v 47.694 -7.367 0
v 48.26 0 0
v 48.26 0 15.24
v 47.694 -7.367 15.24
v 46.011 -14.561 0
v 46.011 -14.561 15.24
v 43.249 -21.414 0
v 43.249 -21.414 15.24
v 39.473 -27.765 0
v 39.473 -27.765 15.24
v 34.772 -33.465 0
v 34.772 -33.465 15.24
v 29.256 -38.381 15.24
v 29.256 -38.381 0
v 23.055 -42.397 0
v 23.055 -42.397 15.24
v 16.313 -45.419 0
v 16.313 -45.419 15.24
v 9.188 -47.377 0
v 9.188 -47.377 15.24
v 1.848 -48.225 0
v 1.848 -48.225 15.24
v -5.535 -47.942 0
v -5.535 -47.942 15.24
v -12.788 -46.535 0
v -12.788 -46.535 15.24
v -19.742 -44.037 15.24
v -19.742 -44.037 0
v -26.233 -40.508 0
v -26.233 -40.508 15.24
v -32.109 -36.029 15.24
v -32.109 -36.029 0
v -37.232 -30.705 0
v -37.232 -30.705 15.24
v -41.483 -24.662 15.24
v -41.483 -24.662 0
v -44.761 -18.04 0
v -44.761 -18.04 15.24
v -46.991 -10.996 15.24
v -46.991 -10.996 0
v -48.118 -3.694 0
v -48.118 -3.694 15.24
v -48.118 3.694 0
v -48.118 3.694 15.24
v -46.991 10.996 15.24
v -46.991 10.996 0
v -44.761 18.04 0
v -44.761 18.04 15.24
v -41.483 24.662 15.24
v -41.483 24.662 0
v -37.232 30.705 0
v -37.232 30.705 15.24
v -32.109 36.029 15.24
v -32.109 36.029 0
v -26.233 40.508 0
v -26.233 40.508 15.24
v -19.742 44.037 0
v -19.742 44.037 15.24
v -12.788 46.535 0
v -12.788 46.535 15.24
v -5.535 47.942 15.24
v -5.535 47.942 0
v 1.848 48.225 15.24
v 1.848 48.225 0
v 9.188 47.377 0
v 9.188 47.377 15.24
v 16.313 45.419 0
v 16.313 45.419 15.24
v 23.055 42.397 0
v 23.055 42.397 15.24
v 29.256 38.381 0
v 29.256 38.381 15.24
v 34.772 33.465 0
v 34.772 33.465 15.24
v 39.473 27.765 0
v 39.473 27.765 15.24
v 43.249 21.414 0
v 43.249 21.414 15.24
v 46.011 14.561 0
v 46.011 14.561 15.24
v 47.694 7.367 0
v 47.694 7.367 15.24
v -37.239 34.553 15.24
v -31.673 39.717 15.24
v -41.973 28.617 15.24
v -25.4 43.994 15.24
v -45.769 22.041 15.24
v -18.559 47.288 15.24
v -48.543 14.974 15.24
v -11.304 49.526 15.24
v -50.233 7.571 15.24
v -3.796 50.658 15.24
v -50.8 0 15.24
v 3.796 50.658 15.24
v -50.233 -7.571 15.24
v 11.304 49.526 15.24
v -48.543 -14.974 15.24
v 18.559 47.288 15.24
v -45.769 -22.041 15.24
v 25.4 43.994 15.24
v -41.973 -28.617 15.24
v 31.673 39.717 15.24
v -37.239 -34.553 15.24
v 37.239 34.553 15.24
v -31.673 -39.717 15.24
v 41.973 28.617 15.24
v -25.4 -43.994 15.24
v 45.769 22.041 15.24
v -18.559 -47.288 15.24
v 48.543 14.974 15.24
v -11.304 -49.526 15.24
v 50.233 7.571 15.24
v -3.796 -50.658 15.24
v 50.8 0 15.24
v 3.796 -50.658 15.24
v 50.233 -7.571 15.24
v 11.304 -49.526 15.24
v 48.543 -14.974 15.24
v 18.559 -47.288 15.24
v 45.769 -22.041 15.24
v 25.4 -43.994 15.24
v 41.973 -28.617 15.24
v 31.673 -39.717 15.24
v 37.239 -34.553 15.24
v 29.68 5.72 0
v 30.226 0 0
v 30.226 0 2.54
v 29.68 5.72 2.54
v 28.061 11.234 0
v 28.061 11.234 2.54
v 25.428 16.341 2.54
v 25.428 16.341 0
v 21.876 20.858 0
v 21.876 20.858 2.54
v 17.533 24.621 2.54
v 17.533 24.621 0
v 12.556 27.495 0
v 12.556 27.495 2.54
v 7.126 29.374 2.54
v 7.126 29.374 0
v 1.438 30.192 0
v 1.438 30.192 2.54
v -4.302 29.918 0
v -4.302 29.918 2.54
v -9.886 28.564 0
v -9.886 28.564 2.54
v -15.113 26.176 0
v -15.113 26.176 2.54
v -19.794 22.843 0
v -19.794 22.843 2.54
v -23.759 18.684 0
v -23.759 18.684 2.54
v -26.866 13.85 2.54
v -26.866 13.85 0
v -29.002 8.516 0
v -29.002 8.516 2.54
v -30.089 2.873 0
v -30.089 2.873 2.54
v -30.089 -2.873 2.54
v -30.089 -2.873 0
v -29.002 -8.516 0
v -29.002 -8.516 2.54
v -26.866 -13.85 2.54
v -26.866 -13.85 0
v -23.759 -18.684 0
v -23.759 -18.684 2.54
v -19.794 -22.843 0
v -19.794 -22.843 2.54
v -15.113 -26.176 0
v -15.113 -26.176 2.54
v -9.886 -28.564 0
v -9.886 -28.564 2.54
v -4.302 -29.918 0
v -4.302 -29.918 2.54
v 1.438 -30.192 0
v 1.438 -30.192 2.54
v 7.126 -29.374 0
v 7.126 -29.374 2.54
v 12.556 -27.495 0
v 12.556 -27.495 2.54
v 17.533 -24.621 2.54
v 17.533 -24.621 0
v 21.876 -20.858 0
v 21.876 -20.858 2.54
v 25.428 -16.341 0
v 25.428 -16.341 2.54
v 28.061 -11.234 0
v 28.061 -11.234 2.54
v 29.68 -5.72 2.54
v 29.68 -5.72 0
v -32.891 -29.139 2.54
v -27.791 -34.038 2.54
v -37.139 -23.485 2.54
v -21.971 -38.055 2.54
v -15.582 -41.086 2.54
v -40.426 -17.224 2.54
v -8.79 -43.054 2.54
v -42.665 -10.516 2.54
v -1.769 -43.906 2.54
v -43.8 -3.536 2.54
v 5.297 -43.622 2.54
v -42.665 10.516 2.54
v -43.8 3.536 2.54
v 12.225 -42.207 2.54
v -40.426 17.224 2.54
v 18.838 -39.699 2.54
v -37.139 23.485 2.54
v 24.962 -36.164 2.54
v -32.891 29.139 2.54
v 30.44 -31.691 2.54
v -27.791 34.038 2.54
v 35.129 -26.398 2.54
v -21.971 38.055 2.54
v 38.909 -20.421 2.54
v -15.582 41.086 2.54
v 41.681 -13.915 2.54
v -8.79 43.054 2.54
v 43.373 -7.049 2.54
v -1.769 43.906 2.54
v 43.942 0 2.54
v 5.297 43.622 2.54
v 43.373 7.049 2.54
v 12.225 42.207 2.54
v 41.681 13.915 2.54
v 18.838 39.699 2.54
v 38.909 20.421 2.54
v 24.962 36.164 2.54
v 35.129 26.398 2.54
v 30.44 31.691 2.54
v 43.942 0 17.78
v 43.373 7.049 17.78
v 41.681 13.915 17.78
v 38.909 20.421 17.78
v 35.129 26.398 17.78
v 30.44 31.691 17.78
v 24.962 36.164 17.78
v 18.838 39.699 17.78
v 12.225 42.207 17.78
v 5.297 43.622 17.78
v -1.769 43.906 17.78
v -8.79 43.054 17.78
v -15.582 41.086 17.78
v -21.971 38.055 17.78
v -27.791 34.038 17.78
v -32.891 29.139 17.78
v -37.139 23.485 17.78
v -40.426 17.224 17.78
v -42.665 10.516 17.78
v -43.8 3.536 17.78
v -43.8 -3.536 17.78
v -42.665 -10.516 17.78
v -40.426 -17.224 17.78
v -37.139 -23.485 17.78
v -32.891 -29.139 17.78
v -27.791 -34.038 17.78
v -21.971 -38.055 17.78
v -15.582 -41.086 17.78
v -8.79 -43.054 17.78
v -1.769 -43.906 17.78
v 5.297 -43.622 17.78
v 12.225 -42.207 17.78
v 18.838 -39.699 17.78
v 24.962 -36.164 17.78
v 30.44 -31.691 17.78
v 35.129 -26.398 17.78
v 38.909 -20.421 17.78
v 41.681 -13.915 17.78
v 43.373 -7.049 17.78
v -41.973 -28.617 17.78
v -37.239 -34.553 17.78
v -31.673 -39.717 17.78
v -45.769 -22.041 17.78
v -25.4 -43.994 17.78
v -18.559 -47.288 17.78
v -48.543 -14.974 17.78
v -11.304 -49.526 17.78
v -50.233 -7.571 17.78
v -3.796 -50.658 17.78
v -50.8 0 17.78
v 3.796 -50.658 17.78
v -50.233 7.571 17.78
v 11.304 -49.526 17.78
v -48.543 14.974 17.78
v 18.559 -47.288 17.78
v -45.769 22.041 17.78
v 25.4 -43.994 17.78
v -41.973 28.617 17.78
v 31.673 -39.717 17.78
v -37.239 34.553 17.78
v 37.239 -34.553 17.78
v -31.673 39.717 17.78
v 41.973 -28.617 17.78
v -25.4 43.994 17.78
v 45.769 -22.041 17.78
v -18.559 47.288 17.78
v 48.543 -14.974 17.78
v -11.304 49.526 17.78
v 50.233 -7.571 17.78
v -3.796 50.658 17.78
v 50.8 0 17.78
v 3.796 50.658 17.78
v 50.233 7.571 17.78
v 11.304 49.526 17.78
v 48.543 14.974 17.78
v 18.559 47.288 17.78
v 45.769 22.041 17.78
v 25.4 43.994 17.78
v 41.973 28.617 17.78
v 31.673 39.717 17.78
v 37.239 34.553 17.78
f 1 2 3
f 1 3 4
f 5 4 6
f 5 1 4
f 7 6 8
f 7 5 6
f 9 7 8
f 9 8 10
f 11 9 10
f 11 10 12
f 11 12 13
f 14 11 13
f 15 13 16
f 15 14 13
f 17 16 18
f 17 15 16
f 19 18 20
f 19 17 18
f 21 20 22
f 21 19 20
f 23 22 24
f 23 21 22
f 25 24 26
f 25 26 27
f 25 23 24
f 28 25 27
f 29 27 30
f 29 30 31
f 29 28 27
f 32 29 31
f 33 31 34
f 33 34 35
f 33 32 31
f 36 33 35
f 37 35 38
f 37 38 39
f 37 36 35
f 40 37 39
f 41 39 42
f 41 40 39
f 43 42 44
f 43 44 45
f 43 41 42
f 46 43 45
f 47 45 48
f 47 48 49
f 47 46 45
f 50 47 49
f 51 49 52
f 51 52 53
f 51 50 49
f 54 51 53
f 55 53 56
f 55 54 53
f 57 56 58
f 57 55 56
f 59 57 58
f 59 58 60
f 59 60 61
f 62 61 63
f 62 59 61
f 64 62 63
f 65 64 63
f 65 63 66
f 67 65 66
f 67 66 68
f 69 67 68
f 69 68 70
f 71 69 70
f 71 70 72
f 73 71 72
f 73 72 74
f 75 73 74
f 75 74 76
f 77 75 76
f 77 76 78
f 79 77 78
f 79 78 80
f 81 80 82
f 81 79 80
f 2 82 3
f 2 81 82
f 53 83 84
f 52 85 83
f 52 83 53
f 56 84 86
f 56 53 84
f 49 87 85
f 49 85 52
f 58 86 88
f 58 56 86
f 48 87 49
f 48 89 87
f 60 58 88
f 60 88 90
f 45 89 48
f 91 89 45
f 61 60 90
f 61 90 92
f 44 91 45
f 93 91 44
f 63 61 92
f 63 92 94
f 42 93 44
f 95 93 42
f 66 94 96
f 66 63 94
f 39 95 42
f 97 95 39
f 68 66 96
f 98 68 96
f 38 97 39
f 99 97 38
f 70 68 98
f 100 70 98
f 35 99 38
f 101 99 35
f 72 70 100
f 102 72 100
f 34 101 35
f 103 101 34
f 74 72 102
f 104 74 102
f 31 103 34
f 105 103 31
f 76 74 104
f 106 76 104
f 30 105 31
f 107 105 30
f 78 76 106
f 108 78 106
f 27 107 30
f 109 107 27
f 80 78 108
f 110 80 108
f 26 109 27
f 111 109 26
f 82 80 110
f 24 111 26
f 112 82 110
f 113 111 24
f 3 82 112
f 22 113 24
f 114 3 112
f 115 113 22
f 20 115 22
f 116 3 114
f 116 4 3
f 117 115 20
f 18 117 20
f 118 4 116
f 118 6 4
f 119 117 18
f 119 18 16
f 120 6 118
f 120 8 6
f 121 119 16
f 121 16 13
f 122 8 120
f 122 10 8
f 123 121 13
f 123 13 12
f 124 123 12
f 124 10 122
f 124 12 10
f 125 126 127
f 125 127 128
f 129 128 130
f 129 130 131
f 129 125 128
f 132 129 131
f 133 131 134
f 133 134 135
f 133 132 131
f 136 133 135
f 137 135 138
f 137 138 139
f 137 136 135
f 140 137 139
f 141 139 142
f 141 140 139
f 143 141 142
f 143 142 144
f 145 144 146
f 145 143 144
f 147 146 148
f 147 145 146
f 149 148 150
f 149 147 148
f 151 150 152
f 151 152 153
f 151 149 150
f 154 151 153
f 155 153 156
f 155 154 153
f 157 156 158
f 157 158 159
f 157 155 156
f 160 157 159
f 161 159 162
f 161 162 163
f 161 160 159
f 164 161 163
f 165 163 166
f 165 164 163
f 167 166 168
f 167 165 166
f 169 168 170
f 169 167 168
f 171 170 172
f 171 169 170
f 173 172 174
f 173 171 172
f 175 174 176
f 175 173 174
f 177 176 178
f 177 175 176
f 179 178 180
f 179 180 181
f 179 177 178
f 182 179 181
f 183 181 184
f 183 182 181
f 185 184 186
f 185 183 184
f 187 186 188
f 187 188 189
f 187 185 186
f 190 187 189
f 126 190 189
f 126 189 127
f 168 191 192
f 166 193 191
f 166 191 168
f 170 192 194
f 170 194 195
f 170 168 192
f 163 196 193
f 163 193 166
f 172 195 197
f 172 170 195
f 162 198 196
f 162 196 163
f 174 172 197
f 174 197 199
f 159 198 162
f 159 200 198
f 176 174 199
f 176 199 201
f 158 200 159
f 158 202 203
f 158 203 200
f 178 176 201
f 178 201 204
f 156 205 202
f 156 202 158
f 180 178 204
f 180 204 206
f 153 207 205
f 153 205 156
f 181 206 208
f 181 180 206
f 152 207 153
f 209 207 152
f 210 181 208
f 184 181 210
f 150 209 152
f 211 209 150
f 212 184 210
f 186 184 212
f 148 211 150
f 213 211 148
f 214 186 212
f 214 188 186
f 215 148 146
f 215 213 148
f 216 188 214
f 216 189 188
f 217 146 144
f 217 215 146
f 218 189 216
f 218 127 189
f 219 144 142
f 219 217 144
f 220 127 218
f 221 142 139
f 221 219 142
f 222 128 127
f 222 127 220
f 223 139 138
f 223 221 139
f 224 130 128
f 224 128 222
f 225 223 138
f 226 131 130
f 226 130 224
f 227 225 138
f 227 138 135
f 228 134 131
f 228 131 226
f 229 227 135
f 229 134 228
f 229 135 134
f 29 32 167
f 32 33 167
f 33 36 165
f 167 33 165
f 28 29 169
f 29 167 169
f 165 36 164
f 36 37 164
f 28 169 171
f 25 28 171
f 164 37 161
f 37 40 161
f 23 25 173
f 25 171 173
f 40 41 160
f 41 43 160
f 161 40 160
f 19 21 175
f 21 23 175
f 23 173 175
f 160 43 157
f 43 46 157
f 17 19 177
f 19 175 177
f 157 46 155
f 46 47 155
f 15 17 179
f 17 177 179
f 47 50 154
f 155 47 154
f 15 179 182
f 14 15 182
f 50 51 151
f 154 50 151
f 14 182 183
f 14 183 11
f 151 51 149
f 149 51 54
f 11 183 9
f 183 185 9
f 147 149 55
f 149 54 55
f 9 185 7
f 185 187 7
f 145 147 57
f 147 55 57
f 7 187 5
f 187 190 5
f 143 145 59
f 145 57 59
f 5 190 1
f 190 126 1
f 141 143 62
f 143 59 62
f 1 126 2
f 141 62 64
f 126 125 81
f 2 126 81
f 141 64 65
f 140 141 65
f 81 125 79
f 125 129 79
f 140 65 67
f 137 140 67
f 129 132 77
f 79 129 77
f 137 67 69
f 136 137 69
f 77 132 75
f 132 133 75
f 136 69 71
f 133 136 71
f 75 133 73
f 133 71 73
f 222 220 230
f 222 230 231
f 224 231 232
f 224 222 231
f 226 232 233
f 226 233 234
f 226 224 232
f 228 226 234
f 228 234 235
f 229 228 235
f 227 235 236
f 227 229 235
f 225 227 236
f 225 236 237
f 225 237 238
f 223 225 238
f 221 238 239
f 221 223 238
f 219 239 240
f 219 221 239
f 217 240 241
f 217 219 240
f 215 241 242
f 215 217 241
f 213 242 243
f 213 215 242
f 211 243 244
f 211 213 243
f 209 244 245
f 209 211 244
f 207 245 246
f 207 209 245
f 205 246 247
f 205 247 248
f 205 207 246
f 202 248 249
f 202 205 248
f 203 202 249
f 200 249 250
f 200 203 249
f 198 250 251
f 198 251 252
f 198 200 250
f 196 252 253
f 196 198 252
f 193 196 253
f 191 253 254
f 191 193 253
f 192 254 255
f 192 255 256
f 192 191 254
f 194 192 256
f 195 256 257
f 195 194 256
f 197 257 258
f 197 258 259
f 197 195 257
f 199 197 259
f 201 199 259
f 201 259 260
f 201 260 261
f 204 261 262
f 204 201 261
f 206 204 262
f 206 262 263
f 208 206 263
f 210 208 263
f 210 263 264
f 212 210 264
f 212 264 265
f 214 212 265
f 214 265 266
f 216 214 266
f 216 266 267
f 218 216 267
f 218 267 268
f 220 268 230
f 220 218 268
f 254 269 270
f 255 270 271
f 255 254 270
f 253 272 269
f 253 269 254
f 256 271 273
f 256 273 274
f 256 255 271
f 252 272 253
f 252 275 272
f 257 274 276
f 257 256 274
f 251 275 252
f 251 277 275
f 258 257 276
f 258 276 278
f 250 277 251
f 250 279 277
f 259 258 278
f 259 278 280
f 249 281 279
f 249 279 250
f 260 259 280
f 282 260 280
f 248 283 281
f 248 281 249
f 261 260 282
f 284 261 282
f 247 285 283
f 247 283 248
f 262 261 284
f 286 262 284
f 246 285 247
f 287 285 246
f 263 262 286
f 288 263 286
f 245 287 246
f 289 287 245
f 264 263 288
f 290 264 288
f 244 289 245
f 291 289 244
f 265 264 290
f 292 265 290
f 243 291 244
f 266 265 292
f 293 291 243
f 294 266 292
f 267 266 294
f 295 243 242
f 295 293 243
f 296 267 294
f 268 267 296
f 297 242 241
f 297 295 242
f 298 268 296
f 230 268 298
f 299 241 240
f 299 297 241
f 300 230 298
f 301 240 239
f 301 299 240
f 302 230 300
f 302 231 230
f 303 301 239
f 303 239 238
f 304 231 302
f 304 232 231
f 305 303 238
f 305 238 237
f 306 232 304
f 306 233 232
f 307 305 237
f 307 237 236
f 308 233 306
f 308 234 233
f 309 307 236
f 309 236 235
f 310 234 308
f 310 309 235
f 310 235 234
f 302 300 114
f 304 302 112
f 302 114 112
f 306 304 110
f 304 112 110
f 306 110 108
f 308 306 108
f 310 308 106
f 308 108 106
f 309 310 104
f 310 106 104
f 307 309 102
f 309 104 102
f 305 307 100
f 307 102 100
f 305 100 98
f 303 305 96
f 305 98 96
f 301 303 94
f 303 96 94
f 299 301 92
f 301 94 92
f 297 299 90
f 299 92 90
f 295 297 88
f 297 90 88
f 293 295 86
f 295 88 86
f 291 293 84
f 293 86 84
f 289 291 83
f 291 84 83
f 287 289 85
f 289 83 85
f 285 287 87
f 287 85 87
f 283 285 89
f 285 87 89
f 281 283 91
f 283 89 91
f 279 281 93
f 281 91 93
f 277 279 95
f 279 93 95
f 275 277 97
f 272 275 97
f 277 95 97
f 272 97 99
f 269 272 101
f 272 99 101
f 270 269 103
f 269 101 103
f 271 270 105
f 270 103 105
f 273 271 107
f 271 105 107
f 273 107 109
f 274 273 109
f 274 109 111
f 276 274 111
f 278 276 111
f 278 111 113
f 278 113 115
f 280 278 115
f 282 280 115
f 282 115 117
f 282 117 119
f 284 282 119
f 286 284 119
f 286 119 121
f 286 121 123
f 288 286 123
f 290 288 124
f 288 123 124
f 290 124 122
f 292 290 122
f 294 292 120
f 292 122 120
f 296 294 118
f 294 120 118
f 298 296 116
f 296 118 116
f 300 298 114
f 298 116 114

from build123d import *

# Parameters (mm, degrees)
F0_R     = 50.8
F0_R_2   = 30.226
F1_DEPTH = 2.54
F2_R     = 50.8
F2_R_2   = 43.942
F3_DEPTH = 15.24
F4_R     = 50.8
F4_R_2   = 48.26
F5_DEPTH = 15.24


with BuildPart() as f1:
    # F0 (on Top) → F1 (new body)
    with BuildSketch(Plane.XY):
        Circle(F0_R)
        Circle(F0_R_2, mode=Mode.SUBTRACT)
    extrude(amount=F1_DEPTH)

    # F2 (on face) → F3 (join)
    with BuildSketch(Plane.XY.offset(2.54)):
        Circle(F2_R)
        Circle(F2_R_2, mode=Mode.SUBTRACT)
    extrude(amount=F3_DEPTH)

    # F4 (on face) → F5 (cut)
    with BuildSketch(Plane(origin=(0, 0, 0), x_dir=(1, 0, 0), z_dir=(0, 0, -1))):
        Circle(F4_R)
        Circle(F4_R_2, mode=Mode.SUBTRACT)
    extrude(amount=-F5_DEPTH, mode=Mode.SUBTRACT)


solid = f1.part
